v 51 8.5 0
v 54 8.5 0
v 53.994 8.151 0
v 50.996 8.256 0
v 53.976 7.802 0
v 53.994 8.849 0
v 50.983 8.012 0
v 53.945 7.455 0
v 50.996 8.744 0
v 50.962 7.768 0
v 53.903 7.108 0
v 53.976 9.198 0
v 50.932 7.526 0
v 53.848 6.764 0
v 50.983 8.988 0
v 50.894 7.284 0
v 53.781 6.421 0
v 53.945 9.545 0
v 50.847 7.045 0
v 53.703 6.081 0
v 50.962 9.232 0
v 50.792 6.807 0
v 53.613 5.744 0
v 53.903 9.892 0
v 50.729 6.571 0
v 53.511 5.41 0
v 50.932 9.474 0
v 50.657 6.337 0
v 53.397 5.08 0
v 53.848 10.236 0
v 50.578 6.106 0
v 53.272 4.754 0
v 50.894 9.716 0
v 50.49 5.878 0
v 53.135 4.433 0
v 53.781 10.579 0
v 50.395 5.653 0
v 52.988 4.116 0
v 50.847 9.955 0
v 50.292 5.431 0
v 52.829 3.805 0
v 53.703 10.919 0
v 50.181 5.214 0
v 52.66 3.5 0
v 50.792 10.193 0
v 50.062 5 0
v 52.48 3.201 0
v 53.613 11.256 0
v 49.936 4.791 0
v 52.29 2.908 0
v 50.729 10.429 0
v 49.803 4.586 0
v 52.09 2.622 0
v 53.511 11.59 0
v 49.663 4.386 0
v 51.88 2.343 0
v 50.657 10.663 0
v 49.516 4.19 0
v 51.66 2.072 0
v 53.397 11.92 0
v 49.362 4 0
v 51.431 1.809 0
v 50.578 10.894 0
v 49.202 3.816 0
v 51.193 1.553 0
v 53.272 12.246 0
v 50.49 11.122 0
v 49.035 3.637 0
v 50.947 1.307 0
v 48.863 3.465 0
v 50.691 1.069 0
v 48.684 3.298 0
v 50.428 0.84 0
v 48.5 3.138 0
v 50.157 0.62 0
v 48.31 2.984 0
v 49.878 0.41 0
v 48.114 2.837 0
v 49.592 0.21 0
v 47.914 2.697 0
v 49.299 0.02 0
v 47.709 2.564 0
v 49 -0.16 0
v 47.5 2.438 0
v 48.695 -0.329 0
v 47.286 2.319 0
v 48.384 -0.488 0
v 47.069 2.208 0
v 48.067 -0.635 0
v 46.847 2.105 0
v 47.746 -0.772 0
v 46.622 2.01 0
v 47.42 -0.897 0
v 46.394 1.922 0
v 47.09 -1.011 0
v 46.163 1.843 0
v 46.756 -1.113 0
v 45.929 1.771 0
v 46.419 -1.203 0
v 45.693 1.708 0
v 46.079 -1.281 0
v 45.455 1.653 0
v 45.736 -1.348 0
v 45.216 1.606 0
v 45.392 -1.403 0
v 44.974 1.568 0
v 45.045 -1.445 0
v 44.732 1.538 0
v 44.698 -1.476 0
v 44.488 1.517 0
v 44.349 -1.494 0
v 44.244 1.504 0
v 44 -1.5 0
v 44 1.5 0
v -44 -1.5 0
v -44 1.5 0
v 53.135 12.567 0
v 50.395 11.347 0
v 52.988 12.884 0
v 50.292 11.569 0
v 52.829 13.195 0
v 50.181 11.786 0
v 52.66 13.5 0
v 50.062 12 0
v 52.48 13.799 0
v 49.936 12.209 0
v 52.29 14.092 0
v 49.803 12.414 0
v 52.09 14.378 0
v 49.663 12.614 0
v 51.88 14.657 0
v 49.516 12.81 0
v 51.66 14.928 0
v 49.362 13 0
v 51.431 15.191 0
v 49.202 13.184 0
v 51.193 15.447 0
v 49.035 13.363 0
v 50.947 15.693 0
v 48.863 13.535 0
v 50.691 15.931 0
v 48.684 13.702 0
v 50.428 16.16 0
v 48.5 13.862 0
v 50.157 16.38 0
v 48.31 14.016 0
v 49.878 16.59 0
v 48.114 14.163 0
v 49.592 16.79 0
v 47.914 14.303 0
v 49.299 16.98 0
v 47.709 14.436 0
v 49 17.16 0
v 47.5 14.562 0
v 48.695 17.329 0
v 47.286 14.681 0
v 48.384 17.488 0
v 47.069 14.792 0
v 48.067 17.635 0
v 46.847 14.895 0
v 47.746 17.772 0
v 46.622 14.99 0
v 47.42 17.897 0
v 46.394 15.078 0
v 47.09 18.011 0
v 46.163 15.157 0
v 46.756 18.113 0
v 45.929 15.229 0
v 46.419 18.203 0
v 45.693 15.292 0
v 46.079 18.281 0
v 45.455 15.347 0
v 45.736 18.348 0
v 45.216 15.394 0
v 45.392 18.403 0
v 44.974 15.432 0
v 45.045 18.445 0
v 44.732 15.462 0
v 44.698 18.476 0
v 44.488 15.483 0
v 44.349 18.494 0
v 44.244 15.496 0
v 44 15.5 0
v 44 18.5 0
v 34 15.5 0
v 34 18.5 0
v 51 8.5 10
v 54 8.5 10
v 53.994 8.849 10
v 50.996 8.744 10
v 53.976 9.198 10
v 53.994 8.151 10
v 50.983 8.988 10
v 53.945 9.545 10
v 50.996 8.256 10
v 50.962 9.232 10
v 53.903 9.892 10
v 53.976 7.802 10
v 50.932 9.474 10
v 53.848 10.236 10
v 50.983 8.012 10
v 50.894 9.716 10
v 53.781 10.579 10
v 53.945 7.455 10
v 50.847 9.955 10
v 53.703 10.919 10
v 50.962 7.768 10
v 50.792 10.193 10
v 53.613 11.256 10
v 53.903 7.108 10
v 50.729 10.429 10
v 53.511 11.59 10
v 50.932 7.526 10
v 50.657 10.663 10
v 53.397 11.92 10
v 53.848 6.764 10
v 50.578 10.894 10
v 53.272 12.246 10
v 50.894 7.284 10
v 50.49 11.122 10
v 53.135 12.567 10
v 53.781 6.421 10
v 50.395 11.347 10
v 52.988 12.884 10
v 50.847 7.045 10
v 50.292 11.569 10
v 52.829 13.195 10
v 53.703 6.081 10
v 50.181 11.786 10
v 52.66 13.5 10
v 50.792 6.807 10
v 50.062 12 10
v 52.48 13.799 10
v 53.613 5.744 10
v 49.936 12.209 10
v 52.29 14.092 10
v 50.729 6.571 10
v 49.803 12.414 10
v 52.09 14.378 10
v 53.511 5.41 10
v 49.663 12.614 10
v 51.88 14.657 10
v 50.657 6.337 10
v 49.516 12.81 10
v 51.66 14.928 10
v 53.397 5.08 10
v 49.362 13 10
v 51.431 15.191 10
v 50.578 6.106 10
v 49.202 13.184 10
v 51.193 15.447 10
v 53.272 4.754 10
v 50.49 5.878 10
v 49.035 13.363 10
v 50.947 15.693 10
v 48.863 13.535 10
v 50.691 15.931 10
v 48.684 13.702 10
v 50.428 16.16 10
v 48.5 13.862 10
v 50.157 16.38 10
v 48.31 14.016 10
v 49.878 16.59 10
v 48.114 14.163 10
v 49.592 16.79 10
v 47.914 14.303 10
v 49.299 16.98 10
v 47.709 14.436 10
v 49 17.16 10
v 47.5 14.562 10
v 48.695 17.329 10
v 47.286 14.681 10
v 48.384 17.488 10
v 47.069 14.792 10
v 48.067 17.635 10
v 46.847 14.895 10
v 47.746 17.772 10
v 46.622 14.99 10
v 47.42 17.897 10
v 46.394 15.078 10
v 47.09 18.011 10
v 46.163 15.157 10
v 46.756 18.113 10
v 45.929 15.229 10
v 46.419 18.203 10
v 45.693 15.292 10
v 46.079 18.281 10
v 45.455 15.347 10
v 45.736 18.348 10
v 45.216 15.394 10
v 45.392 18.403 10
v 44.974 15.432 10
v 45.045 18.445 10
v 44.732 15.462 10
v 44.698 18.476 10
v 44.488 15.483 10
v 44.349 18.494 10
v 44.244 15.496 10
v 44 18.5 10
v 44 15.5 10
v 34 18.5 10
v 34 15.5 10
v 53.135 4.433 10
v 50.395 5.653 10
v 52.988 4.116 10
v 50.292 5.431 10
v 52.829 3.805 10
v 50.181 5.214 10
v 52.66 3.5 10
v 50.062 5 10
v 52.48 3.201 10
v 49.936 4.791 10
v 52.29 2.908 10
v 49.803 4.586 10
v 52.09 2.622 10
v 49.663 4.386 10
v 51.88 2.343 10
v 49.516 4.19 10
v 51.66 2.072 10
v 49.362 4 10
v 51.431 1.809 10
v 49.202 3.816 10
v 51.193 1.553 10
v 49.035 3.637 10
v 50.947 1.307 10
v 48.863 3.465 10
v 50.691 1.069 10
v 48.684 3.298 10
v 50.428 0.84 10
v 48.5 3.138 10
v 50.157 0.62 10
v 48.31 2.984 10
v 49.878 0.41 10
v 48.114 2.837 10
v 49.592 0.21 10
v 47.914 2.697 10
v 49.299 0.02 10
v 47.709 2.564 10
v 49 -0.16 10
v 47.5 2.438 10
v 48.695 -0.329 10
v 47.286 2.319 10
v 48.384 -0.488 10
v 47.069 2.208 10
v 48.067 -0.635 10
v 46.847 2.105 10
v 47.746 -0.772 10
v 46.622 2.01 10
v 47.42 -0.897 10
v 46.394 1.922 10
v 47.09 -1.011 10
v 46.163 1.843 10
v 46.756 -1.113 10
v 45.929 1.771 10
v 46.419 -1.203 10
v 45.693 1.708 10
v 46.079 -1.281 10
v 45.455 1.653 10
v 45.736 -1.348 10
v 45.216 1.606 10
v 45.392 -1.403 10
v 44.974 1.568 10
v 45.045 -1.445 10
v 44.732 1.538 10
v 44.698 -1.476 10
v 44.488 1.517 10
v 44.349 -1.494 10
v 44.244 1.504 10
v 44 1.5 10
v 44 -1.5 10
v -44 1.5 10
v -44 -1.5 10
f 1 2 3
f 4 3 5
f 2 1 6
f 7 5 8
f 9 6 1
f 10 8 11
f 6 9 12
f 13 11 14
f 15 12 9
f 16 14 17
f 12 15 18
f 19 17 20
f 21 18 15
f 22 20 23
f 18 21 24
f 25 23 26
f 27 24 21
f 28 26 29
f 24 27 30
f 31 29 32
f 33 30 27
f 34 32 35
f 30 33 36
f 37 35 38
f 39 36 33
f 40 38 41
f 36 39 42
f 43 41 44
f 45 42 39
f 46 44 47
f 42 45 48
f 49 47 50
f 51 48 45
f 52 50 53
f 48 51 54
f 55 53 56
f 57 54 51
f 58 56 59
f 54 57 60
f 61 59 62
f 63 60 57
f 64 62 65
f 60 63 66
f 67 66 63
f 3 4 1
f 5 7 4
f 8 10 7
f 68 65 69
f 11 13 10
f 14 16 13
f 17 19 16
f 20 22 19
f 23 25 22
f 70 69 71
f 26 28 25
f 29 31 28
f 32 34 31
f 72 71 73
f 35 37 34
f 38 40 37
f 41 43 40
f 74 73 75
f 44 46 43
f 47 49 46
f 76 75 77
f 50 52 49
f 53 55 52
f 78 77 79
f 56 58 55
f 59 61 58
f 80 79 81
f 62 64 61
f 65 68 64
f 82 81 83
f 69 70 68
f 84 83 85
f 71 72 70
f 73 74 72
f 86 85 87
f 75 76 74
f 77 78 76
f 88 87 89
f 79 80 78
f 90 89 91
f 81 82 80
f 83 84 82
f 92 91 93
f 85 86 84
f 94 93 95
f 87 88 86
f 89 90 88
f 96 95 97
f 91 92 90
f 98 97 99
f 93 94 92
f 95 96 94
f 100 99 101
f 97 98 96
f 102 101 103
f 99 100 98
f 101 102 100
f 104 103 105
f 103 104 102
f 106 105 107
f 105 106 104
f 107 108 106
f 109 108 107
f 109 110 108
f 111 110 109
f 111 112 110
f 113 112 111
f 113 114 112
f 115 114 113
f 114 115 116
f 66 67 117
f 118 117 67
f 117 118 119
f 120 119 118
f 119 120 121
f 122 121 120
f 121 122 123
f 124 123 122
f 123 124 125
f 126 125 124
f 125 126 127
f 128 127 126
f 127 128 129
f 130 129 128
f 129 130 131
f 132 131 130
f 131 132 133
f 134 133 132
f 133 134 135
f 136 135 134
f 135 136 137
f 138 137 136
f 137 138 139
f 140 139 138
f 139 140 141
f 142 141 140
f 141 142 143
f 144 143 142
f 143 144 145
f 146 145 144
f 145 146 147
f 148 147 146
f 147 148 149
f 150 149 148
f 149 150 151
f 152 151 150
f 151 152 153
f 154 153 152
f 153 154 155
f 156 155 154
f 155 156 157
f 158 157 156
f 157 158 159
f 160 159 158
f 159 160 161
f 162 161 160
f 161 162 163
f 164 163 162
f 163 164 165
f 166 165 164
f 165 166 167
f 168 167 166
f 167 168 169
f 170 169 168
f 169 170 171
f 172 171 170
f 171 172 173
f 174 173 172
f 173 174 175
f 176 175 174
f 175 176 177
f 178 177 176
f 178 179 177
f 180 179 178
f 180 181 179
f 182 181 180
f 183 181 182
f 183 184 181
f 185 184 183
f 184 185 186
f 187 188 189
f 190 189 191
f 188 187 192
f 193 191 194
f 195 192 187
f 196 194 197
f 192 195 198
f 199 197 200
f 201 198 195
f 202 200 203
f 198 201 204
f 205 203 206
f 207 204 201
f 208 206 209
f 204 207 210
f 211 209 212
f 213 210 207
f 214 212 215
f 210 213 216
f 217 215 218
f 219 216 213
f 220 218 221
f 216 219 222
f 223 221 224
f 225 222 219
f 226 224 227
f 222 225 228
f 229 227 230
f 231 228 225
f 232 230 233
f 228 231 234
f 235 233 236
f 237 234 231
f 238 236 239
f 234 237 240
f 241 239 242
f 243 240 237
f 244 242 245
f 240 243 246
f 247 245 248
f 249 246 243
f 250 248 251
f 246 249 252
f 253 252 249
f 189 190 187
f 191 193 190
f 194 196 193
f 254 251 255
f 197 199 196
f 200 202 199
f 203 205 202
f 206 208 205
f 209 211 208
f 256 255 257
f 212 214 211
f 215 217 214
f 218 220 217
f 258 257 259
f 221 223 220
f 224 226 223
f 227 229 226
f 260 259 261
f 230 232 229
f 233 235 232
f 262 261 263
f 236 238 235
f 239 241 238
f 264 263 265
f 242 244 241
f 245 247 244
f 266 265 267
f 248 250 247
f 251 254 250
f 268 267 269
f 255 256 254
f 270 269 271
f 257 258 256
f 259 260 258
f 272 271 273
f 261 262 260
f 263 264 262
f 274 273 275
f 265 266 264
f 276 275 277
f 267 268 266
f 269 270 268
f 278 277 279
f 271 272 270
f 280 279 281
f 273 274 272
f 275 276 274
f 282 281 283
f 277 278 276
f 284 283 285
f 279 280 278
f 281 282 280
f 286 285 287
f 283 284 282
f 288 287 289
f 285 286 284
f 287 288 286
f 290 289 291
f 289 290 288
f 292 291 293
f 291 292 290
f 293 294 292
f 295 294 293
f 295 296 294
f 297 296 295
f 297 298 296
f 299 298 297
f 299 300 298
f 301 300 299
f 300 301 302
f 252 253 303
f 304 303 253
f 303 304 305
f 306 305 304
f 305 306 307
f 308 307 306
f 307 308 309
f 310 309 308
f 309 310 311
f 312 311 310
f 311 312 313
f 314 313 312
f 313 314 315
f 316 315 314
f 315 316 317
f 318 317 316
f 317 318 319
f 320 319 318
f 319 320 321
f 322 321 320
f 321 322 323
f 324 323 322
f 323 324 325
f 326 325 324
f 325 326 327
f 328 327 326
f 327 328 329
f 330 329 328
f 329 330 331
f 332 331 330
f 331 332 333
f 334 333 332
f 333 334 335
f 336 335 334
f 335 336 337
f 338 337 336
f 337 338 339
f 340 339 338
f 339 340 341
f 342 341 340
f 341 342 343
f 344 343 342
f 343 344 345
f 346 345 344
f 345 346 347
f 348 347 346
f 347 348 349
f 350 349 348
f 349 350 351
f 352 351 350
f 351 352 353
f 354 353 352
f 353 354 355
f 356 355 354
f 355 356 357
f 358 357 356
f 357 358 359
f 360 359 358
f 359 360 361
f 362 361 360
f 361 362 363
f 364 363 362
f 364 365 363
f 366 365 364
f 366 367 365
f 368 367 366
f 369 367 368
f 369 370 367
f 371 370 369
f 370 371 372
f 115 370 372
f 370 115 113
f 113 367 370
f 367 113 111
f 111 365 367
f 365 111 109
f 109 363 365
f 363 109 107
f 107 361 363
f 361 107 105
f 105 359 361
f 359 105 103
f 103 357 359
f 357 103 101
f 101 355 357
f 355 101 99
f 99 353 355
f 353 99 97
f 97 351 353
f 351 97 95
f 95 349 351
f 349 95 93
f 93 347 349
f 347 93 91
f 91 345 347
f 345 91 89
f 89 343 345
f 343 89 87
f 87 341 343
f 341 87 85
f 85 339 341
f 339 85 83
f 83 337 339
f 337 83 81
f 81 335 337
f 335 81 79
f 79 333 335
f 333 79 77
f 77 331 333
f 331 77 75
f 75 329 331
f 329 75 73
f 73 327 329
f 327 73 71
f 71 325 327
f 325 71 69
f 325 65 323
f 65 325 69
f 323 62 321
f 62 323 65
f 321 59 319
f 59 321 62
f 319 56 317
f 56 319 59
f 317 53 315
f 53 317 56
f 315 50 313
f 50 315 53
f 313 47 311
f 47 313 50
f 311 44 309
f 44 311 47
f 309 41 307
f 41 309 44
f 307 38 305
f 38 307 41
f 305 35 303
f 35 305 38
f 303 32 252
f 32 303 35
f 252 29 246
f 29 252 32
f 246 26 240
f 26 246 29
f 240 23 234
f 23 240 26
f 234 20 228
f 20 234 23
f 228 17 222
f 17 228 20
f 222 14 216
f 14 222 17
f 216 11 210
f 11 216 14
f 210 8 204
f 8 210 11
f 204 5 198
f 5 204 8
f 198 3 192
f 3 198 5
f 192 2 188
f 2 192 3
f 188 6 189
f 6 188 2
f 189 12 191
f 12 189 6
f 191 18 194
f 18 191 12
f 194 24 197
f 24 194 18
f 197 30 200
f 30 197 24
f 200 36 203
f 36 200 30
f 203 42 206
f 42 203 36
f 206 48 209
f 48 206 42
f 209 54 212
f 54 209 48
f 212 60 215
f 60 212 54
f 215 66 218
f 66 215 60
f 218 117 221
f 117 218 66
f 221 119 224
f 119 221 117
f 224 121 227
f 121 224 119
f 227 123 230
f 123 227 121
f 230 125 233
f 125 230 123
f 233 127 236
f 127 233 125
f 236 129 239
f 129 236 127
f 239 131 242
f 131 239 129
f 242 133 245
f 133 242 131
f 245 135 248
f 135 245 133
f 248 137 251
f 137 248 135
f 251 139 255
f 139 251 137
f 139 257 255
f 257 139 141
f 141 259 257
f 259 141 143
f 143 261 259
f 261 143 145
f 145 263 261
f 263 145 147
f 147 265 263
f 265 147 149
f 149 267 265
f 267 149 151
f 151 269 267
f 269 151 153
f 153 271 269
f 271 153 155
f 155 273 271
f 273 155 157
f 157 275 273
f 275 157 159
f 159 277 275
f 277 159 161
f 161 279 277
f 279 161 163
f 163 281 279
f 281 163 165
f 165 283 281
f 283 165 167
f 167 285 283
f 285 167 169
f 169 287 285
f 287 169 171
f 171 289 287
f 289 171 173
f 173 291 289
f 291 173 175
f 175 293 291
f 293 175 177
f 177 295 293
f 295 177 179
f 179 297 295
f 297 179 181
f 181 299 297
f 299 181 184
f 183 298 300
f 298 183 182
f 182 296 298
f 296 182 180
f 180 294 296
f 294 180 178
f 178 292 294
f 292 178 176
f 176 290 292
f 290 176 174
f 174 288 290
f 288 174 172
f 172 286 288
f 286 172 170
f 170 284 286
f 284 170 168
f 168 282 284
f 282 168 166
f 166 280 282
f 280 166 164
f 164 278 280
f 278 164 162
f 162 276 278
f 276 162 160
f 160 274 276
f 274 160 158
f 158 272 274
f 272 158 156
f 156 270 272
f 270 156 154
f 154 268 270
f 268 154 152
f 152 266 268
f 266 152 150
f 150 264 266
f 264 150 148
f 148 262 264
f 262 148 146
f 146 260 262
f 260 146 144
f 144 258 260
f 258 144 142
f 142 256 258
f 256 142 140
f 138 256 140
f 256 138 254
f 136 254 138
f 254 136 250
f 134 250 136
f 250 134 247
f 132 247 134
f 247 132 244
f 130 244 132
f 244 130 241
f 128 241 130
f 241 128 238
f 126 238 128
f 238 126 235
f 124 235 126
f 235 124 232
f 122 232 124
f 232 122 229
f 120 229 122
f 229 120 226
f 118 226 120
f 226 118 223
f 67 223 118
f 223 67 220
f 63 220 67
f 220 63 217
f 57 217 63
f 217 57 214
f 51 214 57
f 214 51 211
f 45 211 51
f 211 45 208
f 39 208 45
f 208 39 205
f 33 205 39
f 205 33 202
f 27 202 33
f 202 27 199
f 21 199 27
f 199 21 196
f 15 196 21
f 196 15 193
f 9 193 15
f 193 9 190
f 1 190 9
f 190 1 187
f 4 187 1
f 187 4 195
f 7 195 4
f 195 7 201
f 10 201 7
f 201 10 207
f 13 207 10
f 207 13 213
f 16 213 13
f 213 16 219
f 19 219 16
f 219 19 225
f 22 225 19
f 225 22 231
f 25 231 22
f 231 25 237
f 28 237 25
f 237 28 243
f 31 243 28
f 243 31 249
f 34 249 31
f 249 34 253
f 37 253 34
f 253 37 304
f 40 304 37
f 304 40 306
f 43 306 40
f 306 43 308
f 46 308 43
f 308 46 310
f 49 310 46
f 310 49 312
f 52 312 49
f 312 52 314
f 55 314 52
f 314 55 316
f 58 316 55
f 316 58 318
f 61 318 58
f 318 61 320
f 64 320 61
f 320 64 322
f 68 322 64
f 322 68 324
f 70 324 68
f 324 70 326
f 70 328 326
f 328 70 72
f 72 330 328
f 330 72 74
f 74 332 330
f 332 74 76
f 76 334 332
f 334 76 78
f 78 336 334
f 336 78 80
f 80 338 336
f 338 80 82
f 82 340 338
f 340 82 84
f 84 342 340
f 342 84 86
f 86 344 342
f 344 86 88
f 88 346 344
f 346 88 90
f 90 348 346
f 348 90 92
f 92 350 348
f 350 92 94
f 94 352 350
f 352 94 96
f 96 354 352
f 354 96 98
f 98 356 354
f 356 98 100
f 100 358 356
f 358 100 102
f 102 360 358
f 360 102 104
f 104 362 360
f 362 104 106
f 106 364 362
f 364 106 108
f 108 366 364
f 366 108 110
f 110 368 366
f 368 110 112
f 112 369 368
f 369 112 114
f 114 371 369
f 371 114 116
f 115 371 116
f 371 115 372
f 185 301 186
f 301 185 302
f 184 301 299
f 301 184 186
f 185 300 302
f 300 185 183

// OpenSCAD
/*
Needle cover for knitting machines.
*/
$fn=180;
Diameter = 14;
Radius = Diameter/2;
Length = 118;
LineWidth = 3;
BuildSilverReedCover = 1;
BuildBrotherCover = 2;


Build(BuildBrotherCover);

module Build(item)
{
    if(item == BuildSilverReedCover) SilverReedCover();
    if(item == BuildBrotherCover) BrotherCover();
}

module BrotherCover() {
    height = 10;
    length = 118-30;
    lineWidth = LineWidth;
    diameter = 14;
    catchLength = 10;

    union()
        {
            CoverV2(height, length, lineWidth, diameter);

            translate([(length/2 - catchLength/2), (diameter + lineWidth), 0])
            linear_extrude(height =height)
            square(size=[catchLength, lineWidth], center=true);
        }
}

module SilverReedCover() {
    height = 10;
    length = 118;
    lineWidth = LineWidth;
    diameter = 14;
    Cover(height, length, lineWidth, diameter);
}

module Cover(height, length, lineWidth, hookOD)
{
    radius = hookOD/2;
    linear_extrude(height =height)
    union()
    {
        square(size=[length, lineWidth], center=true);
        translate([length/2 + lineWidth * 2, Radius-1.6 , 0])
        difference()
        {
            circle(r=radius+lineWidth);
            circle(r=radius);
            translate([-radius-8,-4,0])
            square(size=[hookOD + lineWidth, hookOD + lineWidth]);
        }
    }
}

module CoverV2(height, length, lineWidth, hookOD)
{
    echo(height=height, length=length, lineWidth=LineWidth, hookOD=hookOD, radius=radius);
    radius = hookOD/2;
    linear_extrude(height =height)
    union()
    {
        square(size=[length, lineWidth], center=true);
        translate([length/2 ,radius + lineWidth/2 , 0])
        difference()
        {
            circle(r=radius+lineWidth);
            circle(r=radius);
            translate([-(2 * radius + lineWidth),-radius,0])
            #square(size=[hookOD + lineWidth, hookOD + lineWidth]);
        }
    }
}
